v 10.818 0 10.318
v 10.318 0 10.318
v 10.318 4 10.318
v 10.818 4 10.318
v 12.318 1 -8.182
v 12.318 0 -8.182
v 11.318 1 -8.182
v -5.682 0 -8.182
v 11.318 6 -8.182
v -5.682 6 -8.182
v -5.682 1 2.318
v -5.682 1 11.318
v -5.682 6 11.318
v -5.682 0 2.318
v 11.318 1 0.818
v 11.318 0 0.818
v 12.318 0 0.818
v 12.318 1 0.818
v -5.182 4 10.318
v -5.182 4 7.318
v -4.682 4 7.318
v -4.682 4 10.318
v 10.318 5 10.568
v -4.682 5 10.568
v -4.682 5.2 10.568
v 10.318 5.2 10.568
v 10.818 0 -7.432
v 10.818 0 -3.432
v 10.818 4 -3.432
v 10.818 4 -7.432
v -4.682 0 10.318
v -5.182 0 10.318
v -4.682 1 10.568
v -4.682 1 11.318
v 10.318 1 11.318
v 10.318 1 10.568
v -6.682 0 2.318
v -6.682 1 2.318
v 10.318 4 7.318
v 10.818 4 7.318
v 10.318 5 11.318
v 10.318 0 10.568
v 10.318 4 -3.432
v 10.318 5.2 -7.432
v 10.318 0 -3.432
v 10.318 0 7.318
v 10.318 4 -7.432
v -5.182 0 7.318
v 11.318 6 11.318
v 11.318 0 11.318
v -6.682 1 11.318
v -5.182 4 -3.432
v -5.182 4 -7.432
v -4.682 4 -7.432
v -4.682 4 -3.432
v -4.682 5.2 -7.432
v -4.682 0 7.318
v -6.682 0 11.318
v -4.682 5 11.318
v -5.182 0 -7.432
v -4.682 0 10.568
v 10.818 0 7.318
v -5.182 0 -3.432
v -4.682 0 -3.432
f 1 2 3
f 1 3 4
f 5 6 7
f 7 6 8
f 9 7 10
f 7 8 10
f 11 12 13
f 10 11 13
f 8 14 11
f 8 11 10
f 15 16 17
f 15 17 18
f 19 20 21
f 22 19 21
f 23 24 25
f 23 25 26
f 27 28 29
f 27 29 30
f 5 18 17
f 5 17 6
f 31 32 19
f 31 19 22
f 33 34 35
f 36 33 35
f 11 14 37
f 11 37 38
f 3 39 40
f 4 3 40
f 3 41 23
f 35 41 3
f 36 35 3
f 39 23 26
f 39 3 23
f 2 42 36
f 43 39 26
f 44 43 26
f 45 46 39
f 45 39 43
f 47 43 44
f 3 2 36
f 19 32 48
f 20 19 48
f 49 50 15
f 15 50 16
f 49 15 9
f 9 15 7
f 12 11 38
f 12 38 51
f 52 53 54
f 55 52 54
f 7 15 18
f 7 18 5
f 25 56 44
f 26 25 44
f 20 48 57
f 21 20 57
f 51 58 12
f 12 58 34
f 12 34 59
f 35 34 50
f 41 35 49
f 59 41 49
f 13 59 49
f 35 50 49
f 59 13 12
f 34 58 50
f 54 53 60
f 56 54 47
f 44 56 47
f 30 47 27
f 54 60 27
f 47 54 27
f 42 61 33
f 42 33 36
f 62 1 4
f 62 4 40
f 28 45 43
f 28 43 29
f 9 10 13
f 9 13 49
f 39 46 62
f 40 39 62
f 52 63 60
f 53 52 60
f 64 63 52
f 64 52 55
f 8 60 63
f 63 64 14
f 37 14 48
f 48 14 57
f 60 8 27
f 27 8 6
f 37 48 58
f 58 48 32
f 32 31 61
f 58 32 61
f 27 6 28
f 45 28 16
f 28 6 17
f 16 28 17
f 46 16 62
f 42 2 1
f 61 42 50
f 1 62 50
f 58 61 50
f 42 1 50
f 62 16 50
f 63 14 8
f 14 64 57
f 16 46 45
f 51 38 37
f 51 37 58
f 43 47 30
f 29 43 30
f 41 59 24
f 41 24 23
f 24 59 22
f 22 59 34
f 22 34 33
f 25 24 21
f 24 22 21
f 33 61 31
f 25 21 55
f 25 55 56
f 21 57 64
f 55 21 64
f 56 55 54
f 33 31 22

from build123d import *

# Parameters (mm, degrees)
SKETCH1_W           = 17
SKETCH1_H           = 19.5
BOSS_EXTRUDE1_DEPTH = 6
SKETCH2_W           = 15
SKETCH2_H           = 18
CUT_EXTRUDE1_DEPTH  = 5.2
SKETCH4_W           = 9
SKETCH4_H           = 1
BOSS_EXTRUDE2_DEPTH = 1
SKETCH3_W           = 9
SKETCH3_H           = 1
BOSS_EXTRUDE3_DEPTH = 1
SKETCH5_W           = 15
SKETCH5_H           = 4
CUT_EXTRUDE2_DEPTH  = 14
SKETCH6_W           = 16
SKETCH6_H           = 4
SKETCH6_H_2         = 3
CUT_EXTRUDE3_DEPTH  = 4


with BuildPart() as part:
    # Sketch1 → Boss-Extrude1 (new body)
    with BuildSketch(Plane(origin=(0, 0, 0), x_dir=(1, 0, 0), z_dir=(0, 1, 0))):
        with Locations((2.818181818, -1.568181818)):
            Rectangle(SKETCH1_W, SKETCH1_H)
    extrude(amount=BOSS_EXTRUDE1_DEPTH)

    # Sketch2 → Cut-Extrude1 (cut)
    with BuildSketch(Plane(origin=(0, 0, 0), x_dir=(1, 0, 0), z_dir=(0, 1, 0))):
        with Locations((2.818181818, -1.568181818)):
            Rectangle(SKETCH2_W, SKETCH2_H)
    extrude(amount=CUT_EXTRUDE1_DEPTH, mode=Mode.SUBTRACT)

    # Sketch4 → Boss-Extrude2 (add)
    with BuildSketch(Plane(origin=(11.318181818, 0, 0), x_dir=(0, 0, -1), z_dir=(1, 0, 0))):
        with Locations((3.681818182, 0.5)):
            Rectangle(SKETCH4_W, SKETCH4_H)
    extrude(amount=BOSS_EXTRUDE2_DEPTH)

    # Sketch3 → Boss-Extrude3 (add)
    with BuildSketch(Plane.ZY.offset(5.681818182)):
        with Locations((6.818181818, 0.5)):
            Rectangle(SKETCH3_W, SKETCH3_H)
    extrude(amount=BOSS_EXTRUDE3_DEPTH)

    # Sketch5 → Cut-Extrude2 (cut)
    with BuildSketch(Plane.XY.offset(11.318181818)):
        with Locations((2.818181818, 3)):
            Rectangle(SKETCH5_W, SKETCH5_H)
    extrude(amount=-CUT_EXTRUDE2_DEPTH, mode=Mode.SUBTRACT)

    # Sketch6 → Cut-Extrude3 (cut)
    with BuildSketch(Plane(origin=(0, 0, 0), x_dir=(1, 0, 0), z_dir=(0, 1, 0))):
        with Locations((2.818181818, 5.431818182)):
            Rectangle(SKETCH6_W, SKETCH6_H)
        with Locations((2.818181818, -8.818181818)):
            Rectangle(SKETCH6_W, SKETCH6_H_2)
    extrude(amount=CUT_EXTRUDE3_DEPTH, mode=Mode.SUBTRACT)


solid = part.part
